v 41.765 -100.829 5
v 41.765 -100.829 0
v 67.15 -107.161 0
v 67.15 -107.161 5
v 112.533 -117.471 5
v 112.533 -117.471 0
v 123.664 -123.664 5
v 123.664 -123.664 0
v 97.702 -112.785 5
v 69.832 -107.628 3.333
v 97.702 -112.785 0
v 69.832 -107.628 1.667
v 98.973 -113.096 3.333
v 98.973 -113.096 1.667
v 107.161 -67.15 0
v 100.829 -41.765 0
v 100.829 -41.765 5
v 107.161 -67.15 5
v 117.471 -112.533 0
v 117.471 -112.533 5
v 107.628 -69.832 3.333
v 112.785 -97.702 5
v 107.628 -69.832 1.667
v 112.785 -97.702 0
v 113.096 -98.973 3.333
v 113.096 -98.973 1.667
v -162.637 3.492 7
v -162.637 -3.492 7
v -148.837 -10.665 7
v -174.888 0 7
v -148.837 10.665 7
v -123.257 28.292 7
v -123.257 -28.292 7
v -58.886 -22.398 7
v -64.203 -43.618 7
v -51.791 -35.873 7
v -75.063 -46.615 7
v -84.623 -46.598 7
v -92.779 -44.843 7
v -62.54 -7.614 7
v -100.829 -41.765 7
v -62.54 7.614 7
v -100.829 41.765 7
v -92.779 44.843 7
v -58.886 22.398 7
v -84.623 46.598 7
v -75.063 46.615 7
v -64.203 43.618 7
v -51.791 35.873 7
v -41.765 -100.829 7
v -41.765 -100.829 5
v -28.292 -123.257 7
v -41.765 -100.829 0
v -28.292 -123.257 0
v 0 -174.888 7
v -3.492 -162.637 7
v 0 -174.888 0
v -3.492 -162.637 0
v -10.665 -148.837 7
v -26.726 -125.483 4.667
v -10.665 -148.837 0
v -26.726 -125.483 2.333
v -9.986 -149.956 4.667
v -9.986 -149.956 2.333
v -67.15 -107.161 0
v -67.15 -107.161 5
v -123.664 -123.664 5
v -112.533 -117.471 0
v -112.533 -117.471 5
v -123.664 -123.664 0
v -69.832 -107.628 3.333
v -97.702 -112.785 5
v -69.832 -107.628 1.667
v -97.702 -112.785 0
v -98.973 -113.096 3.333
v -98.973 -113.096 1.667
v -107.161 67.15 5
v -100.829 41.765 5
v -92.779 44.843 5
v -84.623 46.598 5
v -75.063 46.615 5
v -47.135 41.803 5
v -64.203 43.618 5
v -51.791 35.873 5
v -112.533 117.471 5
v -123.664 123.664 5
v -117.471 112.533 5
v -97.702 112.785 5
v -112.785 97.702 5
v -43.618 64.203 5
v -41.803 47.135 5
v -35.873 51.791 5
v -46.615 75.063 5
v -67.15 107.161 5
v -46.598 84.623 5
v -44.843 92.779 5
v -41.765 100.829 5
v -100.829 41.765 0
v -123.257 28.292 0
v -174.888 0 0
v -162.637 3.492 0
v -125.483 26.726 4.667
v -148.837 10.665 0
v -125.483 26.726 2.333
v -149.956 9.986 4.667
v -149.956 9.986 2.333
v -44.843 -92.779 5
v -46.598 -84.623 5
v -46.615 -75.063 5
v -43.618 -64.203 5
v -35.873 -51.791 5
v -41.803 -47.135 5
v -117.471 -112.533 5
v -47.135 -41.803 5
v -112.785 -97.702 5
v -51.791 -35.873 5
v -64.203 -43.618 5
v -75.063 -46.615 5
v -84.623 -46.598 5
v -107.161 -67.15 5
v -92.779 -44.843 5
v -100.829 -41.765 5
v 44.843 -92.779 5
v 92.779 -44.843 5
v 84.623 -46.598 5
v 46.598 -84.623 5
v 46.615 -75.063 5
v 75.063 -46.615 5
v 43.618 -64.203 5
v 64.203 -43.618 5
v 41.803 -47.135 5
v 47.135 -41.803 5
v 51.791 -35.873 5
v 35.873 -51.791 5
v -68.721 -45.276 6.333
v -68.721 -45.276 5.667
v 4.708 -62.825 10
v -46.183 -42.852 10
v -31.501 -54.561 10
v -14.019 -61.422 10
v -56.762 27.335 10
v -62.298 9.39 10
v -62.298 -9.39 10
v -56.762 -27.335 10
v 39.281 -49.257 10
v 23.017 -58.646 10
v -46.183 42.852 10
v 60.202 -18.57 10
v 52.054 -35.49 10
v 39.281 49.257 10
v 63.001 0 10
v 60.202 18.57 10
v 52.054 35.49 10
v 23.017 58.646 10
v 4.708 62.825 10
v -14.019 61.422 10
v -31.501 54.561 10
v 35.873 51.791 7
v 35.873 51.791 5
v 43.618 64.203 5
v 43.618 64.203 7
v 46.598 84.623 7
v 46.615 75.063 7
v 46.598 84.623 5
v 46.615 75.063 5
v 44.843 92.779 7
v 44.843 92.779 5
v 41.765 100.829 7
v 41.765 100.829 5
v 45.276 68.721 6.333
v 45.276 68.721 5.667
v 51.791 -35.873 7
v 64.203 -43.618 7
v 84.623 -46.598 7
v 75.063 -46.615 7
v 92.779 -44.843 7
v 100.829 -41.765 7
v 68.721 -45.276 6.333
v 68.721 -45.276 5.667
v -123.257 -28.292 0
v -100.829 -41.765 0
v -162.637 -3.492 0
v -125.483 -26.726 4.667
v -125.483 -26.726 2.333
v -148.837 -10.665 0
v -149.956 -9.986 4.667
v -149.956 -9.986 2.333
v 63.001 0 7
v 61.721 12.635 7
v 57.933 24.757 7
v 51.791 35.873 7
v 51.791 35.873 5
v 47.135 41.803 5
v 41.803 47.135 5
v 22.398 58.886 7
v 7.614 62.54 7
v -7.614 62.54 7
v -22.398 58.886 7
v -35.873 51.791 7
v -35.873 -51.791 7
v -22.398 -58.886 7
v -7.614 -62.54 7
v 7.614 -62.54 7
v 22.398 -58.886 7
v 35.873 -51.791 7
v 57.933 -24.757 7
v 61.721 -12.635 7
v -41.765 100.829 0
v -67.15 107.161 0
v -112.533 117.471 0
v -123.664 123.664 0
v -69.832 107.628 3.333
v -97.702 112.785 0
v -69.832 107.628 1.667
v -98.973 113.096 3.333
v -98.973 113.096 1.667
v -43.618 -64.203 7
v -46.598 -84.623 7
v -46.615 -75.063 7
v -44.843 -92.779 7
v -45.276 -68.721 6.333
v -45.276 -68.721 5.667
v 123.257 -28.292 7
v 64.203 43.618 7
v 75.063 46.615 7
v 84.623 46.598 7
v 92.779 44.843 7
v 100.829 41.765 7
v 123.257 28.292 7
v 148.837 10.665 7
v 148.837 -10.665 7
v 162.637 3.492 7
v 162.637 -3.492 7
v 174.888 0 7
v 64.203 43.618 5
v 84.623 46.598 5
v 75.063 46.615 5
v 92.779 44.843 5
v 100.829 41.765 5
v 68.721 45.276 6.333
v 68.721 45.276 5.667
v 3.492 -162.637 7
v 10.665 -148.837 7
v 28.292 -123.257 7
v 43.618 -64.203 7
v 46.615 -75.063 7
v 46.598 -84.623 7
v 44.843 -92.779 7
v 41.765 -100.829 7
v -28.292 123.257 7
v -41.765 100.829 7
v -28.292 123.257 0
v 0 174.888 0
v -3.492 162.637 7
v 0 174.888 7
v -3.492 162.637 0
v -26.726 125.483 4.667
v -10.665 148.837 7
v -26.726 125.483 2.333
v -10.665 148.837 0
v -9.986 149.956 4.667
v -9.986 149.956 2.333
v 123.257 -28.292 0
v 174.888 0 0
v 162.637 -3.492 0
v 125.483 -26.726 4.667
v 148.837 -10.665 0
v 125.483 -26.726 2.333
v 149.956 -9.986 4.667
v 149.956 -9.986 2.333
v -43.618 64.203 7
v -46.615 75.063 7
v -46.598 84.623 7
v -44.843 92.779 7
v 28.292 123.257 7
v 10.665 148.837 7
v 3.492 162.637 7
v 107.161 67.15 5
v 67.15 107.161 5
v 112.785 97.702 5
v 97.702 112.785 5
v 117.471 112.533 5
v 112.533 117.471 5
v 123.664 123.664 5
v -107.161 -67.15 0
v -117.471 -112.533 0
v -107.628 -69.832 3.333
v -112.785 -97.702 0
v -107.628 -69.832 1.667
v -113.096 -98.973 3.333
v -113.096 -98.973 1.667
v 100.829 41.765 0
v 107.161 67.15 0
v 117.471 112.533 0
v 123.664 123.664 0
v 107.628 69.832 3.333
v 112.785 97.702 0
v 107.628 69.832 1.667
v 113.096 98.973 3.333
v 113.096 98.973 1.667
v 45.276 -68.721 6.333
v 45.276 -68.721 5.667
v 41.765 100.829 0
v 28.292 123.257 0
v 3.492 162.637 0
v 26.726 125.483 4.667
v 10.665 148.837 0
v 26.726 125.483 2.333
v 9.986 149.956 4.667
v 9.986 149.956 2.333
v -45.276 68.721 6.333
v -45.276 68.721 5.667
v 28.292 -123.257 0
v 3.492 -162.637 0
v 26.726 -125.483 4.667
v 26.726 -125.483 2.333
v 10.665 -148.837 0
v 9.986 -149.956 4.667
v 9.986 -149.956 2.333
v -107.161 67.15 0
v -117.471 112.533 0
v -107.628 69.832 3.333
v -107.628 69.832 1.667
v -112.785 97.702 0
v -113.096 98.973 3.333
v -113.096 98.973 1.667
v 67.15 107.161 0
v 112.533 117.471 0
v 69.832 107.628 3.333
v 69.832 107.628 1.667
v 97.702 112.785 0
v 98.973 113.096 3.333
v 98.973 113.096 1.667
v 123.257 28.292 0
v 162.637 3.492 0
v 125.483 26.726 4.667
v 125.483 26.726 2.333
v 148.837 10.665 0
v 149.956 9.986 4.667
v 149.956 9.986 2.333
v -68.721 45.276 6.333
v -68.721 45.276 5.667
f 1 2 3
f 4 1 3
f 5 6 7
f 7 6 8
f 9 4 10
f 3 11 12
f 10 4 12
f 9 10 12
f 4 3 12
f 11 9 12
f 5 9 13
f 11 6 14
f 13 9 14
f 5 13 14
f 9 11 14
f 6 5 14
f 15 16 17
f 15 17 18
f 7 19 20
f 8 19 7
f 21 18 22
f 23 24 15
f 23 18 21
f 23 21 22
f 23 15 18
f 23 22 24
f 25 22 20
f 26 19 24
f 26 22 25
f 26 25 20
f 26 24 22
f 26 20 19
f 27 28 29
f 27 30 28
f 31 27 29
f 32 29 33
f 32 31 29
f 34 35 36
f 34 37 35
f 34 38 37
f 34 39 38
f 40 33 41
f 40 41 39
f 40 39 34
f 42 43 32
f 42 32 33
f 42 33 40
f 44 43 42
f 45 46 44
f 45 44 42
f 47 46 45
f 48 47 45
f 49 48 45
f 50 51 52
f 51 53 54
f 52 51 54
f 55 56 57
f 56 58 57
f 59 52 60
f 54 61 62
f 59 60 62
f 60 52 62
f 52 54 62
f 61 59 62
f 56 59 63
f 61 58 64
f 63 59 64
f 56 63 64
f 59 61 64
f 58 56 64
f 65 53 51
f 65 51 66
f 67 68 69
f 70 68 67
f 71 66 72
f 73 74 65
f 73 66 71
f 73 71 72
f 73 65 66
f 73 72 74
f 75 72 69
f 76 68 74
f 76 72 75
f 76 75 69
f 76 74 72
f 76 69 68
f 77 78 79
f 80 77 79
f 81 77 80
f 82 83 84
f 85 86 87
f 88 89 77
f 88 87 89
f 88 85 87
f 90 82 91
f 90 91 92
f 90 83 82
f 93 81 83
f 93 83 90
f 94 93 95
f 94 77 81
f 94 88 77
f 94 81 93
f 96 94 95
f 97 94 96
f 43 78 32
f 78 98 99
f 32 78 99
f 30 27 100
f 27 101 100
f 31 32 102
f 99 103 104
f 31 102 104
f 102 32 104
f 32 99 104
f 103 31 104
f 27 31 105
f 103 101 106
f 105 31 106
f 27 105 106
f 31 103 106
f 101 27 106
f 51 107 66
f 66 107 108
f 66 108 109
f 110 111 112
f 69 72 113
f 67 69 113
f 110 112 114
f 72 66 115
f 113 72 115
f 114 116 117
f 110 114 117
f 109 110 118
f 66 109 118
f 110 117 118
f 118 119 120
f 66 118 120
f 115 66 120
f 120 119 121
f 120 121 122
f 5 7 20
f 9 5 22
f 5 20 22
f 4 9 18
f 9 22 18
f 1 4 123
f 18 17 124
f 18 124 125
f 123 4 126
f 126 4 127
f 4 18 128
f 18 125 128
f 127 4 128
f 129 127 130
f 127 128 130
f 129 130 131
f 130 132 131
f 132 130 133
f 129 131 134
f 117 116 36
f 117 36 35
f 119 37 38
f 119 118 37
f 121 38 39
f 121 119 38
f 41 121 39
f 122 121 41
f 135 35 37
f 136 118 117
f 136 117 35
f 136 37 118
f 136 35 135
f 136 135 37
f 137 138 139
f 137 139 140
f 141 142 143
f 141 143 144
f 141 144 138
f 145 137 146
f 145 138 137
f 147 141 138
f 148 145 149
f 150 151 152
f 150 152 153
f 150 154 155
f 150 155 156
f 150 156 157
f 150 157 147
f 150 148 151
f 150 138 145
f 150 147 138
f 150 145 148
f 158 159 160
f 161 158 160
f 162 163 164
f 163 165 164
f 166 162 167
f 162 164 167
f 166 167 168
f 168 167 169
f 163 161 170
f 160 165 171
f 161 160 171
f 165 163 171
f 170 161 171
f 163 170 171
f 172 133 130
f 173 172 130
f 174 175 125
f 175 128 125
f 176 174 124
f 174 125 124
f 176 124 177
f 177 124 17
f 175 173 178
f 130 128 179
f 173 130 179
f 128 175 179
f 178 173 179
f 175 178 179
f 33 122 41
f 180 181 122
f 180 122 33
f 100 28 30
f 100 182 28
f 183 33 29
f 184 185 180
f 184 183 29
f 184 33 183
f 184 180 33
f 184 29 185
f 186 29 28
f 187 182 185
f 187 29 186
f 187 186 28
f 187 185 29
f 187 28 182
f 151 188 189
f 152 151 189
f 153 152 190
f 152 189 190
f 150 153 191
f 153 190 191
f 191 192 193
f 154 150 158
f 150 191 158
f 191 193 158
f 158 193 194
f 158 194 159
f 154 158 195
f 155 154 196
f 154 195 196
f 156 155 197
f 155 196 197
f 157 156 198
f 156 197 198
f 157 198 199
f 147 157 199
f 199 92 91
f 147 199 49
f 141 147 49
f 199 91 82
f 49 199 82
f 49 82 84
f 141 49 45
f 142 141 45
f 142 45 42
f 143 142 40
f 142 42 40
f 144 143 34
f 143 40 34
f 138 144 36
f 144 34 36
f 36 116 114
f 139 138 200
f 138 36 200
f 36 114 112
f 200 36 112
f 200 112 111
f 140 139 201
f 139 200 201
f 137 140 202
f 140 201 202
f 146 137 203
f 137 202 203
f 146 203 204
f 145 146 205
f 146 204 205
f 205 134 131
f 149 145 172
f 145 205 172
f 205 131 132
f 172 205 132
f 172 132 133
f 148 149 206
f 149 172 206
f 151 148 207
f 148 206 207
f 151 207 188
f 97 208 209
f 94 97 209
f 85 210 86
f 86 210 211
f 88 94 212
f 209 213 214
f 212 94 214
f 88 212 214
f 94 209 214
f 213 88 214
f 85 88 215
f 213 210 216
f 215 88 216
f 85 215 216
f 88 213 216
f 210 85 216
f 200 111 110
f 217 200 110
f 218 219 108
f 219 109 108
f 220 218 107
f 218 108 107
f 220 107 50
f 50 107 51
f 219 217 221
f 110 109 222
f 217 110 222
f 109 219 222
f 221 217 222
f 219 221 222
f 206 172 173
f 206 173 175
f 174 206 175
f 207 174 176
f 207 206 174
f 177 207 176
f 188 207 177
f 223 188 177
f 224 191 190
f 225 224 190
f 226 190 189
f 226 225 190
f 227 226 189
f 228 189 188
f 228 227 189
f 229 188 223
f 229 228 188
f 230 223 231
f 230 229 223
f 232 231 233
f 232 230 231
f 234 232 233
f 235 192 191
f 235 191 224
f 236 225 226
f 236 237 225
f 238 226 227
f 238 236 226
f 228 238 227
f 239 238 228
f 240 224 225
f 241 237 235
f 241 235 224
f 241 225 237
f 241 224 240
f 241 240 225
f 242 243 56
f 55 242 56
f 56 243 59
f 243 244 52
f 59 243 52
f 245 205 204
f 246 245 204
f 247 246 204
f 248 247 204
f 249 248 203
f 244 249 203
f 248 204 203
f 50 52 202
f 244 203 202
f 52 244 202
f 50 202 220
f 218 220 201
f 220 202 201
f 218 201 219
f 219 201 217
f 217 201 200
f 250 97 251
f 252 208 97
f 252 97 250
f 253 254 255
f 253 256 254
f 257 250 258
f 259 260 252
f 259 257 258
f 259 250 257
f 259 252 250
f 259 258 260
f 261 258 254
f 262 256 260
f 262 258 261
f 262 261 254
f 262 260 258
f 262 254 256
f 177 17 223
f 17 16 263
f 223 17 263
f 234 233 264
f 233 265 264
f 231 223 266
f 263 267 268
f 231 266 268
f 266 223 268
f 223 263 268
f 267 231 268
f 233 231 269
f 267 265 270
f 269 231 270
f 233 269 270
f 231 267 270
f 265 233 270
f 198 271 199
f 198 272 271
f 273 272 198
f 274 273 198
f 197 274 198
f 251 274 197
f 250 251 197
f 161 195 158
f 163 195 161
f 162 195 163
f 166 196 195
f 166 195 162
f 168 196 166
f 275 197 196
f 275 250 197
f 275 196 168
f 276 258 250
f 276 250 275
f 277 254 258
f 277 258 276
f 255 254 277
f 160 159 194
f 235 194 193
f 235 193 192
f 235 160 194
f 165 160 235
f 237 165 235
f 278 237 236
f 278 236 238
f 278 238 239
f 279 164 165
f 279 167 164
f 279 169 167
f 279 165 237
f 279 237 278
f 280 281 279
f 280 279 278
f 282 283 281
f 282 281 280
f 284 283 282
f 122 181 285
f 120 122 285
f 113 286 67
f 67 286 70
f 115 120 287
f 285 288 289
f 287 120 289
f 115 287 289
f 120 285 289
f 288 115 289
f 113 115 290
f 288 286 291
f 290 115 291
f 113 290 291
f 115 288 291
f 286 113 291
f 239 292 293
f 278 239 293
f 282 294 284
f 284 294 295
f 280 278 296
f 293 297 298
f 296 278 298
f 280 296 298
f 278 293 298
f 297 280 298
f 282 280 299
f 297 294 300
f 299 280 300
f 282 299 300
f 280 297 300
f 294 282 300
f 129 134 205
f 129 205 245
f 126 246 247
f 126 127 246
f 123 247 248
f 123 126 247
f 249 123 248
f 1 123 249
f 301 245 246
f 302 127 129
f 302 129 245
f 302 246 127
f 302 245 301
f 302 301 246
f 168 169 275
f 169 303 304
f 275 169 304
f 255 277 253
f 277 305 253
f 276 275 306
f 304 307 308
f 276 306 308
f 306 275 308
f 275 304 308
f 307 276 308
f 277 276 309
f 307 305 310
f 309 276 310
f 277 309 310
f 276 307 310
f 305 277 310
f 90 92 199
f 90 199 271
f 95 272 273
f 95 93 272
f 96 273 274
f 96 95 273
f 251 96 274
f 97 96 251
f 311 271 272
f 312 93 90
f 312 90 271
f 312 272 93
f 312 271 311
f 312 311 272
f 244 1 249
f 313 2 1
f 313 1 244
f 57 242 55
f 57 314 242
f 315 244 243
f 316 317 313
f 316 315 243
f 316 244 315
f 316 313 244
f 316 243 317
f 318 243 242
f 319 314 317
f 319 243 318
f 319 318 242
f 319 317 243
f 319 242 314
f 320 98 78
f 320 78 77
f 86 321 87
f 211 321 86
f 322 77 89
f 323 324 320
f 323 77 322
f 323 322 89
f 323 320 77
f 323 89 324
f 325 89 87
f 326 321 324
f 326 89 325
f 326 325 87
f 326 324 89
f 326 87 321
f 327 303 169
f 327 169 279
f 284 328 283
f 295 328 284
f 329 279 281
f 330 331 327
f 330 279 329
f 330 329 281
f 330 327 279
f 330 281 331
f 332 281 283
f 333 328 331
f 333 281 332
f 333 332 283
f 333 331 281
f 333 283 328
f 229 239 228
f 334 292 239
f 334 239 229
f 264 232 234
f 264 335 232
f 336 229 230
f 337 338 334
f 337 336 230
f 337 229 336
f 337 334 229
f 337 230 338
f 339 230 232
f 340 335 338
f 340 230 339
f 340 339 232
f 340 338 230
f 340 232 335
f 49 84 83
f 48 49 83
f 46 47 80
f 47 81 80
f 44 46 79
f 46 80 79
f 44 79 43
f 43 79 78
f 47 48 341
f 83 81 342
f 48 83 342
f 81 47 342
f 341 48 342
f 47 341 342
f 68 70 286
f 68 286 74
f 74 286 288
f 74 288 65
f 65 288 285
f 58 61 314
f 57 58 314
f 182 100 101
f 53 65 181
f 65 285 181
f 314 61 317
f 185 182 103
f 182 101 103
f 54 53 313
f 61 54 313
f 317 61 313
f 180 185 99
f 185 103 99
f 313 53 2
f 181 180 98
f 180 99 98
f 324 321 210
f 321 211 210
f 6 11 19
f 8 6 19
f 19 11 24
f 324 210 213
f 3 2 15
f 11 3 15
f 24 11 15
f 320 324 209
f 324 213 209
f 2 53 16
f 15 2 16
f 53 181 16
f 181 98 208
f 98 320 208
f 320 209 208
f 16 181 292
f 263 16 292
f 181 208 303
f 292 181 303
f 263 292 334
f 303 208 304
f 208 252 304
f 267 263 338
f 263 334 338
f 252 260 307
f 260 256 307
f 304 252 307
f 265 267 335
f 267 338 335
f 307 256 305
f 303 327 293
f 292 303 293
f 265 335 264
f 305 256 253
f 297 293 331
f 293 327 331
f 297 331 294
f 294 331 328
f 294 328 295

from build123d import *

# Parameters (mm, degrees)
BOSS_EXTRUDE1_DEPTH = 10
BOSS_EXTRUDE2_DEPTH = 7
BOSS_EXTRUDE3_DEPTH = 5


with BuildPart() as part:
    # Sketch1 → Boss-Extrude1 (new body)
    with BuildSketch(Plane.XY):
        with BuildLine():
            ThreePointArc((51.791249261, -35.872667893), (60.133623009, -18.79173184), (63.001442855, 0))
            ThreePointArc((63.001442855, 0), (60.133623009, 18.79173184), (51.791249261, 35.872667893))
            ThreePointArc((51.791249261, 35.872667893), (44.548747467, 44.548747467), (35.872667893, 51.791249261))
            ThreePointArc((35.872667893, 51.791249261), (0, 63.001442855), (-35.872667893, 51.791249261))
            ThreePointArc((-35.872667893, 51.791249261), (-44.548747467, 44.548747467), (-51.791249261, 35.872667893))
            ThreePointArc((-51.791249261, 35.872667893), (-63.001442855, 0), (-51.791249261, -35.872667893))
            ThreePointArc((-51.791249261, -35.872667893), (-44.548747467, -44.548747467), (-35.872667893, -51.791249261))
            ThreePointArc((-35.872667893, -51.791249261), (0, -63.001442855), (35.872667893, -51.791249261))
            ThreePointArc((35.872667893, -51.791249261), (44.548747467, -44.548747467), (51.791249261, -35.872667893))
        make_face()
    extrude(amount=BOSS_EXTRUDE1_DEPTH)

    # Sketch1<3> → Boss-Extrude2 (add)
    with BuildSketch(Plane.XY):
        with BuildLine():
            ThreePointArc((51.791249261, 35.872667893), (63.001442855, 0), (51.791249261, -35.872667893))
            add(Edge.make_bspline(
                [(51.791249261, -35.872667893), (96.722520649, -72.648743073), (133.625302995, -6.166423411), (174.887829117, 0)],
                knots=[0, 0, 0, 0, 1, 1, 1, 1], degree=3))
            add(Edge.make_bspline(
                [(174.887829117, 0), (133.625302995, 6.166423411), (96.722520649, 72.648743073), (51.791249261, 35.872667893)],
                knots=[0.38504414, 0.38504414, 0.38504414, 0.38504414, 1.38504414, 1.38504414, 1.38504414, 1.38504414], degree=3))
        make_face()
        with BuildLine():
            ThreePointArc((-35.872667893, 51.791249261), (0, 63.001442855), (35.872667893, 51.791249261))
            add(Edge.make_bspline(
                [(35.872667893, 51.791249261), (72.648743073, 96.722520649), (6.166423411, 133.625302995), (0, 174.887829117)],
                knots=[0, 0, 0, 0, 1, 1, 1, 1], degree=3))
            add(Edge.make_bspline(
                [(0, 174.887829117), (-6.166423411, 133.625302995), (-72.648743073, 96.722520649), (-35.872667893, 51.791249261)],
                knots=[0.38504414, 0.38504414, 0.38504414, 0.38504414, 1.38504414, 1.38504414, 1.38504414, 1.38504414], degree=3))
        make_face()
        with BuildLine():
            add(Edge.make_bspline(
                [(0, -174.887829117), (6.166423411, -133.625302995), (72.648743073, -96.722520649), (35.872667893, -51.791249261)],
                knots=[0.38504414, 0.38504414, 0.38504414, 0.38504414, 1.38504414, 1.38504414, 1.38504414, 1.38504414], degree=3))
            ThreePointArc((35.872667893, -51.791249261), (0, -63.001442855), (-35.872667893, -51.791249261))
            add(Edge.make_bspline(
                [(-35.872667893, -51.791249261), (-72.648743073, -96.722520649), (-6.166423411, -133.625302995), (0, -174.887829117)],
                knots=[0, 0, 0, 0, 1, 1, 1, 1], degree=3))
        make_face()
        with BuildLine():
            ThreePointArc((-51.791249261, -35.872667893), (-63.001442855, 0), (-51.791249261, 35.872667893))
            add(Edge.make_bspline(
                [(-51.791249261, 35.872667893), (-96.722520649, 72.648743073), (-133.625302995, 6.166423411), (-174.887829117, 0)],
                knots=[0, 0, 0, 0, 1, 1, 1, 1], degree=3))
            add(Edge.make_bspline(
                [(-174.887829117, 0), (-133.625302995, -6.166423411), (-96.722520649, -72.648743073), (-51.791249261, -35.872667893)],
                knots=[0.38504414, 0.38504414, 0.38504414, 0.38504414, 1.38504414, 1.38504414, 1.38504414, 1.38504414], degree=3))
        make_face()
    extrude(amount=BOSS_EXTRUDE2_DEPTH)

    # Sketch1<4> → Boss-Extrude3 (add)
    with BuildSketch(Plane.XY):
        with BuildLine():
            ThreePointArc((35.872667893, 51.791249261), (44.548747467, 44.548747467), (51.791249261, 35.872667893))
            add(Edge.make_bspline(
                [(51.791249261, 35.872667893), (69.091772014, 50.033080135), (85.201999092, 48.884507071), (100.829128316, 41.764792431)],
                knots=[0, 0, 0, 0, 0.38504414, 0.38504414, 0.38504414, 0.38504414], degree=3))
            add(Edge.make_bspline(
                [(100.829128316, 41.764792431), (110.436752916, 67.453341468), (108.403199611, 103.040391174), (123.664369915, 123.664369915)],
                knots=[0.38504414, 0.38504414, 0.38504414, 0.38504414, 1, 1, 1, 1], degree=3))
            add(Edge.make_bspline(
                [(41.764792431, 100.829128316), (67.453341468, 110.436752916), (103.040391174, 108.403199611), (123.664369915, 123.664369915)],
                knots=[0.38504414, 0.38504414, 0.38504414, 0.38504414, 1, 1, 1, 1], degree=3))
            add(Edge.make_bspline(
                [(35.872667893, 51.791249261), (50.033080135, 69.091772014), (48.884507071, 85.201999092), (41.764792431, 100.829128316)],
                knots=[0, 0, 0, 0, 0.38504414, 0.38504414, 0.38504414, 0.38504414], degree=3))
        make_face()
        with BuildLine():
            add(Edge.make_bspline(
                [(51.791249261, -35.872667893), (69.091772014, -50.033080135), (85.201999092, -48.884507071), (100.829128316, -41.764792431)],
                knots=[0, 0, 0, 0, 0.38504414, 0.38504414, 0.38504414, 0.38504414], degree=3))
            ThreePointArc((51.791249261, -35.872667893), (44.548747467, -44.548747467), (35.872667893, -51.791249261))
            add(Edge.make_bspline(
                [(35.872667893, -51.791249261), (50.033080135, -69.091772014), (48.884507071, -85.201999092), (41.764792431, -100.829128316)],
                knots=[0, 0, 0, 0, 0.38504414, 0.38504414, 0.38504414, 0.38504414], degree=3))
            add(Edge.make_bspline(
                [(41.764792431, -100.829128316), (67.453341468, -110.436752916), (103.040391174, -108.403199611), (123.664369915, -123.664369915)],
                knots=[0.38504414, 0.38504414, 0.38504414, 0.38504414, 1, 1, 1, 1], degree=3))
            add(Edge.make_bspline(
                [(100.829128316, -41.764792431), (110.436752916, -67.453341468), (108.403199611, -103.040391174), (123.664369915, -123.664369915)],
                knots=[0.38504414, 0.38504414, 0.38504414, 0.38504414, 1, 1, 1, 1], degree=3))
        make_face()
        with BuildLine():
            ThreePointArc((-51.791249261, 35.872667893), (-44.548747467, 44.548747467), (-35.872667893, 51.791249261))
            add(Edge.make_bspline(
                [(-35.872667893, 51.791249261), (-50.033080135, 69.091772014), (-48.884507071, 85.201999092), (-41.764792431, 100.829128316)],
                knots=[0, 0, 0, 0, 0.38504414, 0.38504414, 0.38504414, 0.38504414], degree=3))
            add(Edge.make_bspline(
                [(-41.764792431, 100.829128316), (-67.453341468, 110.436752916), (-103.040391174, 108.403199611), (-123.664369915, 123.664369915)],
                knots=[0.38504414, 0.38504414, 0.38504414, 0.38504414, 1, 1, 1, 1], degree=3))
            add(Edge.make_bspline(
                [(-100.829128316, 41.764792431), (-110.436752916, 67.453341468), (-108.403199611, 103.040391174), (-123.664369915, 123.664369915)],
                knots=[0.38504414, 0.38504414, 0.38504414, 0.38504414, 1, 1, 1, 1], degree=3))
            add(Edge.make_bspline(
                [(-51.791249261, 35.872667893), (-69.091772014, 50.033080135), (-85.201999092, 48.884507071), (-100.829128316, 41.764792431)],
                knots=[0, 0, 0, 0, 0.38504414, 0.38504414, 0.38504414, 0.38504414], degree=3))
        make_face()
        with BuildLine():
            add(Edge.make_bspline(
                [(-35.872667893, -51.791249261), (-50.033080135, -69.091772014), (-48.884507071, -85.201999092), (-41.764792431, -100.829128316)],
                knots=[0, 0, 0, 0, 0.38504414, 0.38504414, 0.38504414, 0.38504414], degree=3))
            ThreePointArc((-35.872667893, -51.791249261), (-44.548747467, -44.548747467), (-51.791249261, -35.872667893))
            add(Edge.make_bspline(
                [(-51.791249261, -35.872667893), (-69.091772014, -50.033080135), (-85.201999092, -48.884507071), (-100.829128316, -41.764792431)],
                knots=[0, 0, 0, 0, 0.38504414, 0.38504414, 0.38504414, 0.38504414], degree=3))
            add(Edge.make_bspline(
                [(-100.829128316, -41.764792431), (-110.436752916, -67.453341468), (-108.403199611, -103.040391174), (-123.664369915, -123.664369915)],
                knots=[0.38504414, 0.38504414, 0.38504414, 0.38504414, 1, 1, 1, 1], degree=3))
            add(Edge.make_bspline(
                [(-41.764792431, -100.829128316), (-67.453341468, -110.436752916), (-103.040391174, -108.403199611), (-123.664369915, -123.664369915)],
                knots=[0.38504414, 0.38504414, 0.38504414, 0.38504414, 1, 1, 1, 1], degree=3))
        make_face()
    extrude(amount=BOSS_EXTRUDE3_DEPTH)


solid = part.part
